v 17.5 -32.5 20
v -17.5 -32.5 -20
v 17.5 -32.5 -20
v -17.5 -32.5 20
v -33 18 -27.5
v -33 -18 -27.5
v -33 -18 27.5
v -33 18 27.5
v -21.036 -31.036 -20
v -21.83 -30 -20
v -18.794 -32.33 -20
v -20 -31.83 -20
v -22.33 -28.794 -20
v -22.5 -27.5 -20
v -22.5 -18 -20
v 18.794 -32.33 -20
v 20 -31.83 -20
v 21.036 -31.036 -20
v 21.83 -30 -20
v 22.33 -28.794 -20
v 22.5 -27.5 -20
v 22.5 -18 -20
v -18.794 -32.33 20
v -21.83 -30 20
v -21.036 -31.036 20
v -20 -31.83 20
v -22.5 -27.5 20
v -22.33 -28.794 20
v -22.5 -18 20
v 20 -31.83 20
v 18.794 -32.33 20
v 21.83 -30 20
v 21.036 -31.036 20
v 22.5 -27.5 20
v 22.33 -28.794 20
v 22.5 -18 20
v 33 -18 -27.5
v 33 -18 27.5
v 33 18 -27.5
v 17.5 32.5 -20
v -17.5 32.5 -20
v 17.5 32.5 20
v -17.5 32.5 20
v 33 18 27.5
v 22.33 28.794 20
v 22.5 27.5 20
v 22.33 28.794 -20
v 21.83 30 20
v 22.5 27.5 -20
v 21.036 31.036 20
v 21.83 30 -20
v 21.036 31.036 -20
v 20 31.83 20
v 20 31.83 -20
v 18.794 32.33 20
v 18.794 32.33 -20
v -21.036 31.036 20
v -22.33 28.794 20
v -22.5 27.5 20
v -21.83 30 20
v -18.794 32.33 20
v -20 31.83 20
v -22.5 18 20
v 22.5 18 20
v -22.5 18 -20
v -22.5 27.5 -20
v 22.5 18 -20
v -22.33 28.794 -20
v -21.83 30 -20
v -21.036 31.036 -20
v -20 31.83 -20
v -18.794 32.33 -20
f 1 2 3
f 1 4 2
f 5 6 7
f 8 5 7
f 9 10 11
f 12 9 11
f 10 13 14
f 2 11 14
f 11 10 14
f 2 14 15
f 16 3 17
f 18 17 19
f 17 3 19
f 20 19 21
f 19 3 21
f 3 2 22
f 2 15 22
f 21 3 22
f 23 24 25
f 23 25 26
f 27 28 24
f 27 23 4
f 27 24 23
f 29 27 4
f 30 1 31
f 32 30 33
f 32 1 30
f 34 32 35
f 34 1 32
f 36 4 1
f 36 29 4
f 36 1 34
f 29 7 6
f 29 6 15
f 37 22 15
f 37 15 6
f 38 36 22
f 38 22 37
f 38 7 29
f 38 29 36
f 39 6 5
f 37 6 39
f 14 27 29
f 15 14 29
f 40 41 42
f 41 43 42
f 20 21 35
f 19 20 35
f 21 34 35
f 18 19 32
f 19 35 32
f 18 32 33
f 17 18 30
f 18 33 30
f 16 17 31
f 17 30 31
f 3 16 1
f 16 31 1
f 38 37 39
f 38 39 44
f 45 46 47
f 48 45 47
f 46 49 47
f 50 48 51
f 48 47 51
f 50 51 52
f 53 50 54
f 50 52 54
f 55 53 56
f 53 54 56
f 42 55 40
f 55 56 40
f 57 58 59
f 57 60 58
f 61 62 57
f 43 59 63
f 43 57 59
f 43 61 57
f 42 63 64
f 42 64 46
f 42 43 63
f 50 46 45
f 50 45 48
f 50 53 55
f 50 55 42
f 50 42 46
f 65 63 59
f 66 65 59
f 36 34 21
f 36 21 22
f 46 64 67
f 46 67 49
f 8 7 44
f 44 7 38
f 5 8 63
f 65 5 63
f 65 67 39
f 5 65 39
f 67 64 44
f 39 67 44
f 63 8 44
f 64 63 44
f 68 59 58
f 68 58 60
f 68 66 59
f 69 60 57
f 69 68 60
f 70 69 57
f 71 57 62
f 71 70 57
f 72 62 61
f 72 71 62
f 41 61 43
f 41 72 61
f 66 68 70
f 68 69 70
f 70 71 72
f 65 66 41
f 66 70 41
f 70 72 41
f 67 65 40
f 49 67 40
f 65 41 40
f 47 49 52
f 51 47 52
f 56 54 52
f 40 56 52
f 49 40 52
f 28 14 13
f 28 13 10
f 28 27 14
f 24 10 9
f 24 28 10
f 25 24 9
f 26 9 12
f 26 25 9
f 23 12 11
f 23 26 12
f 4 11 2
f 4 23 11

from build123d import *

# Parameters (mm, degrees)
SKETCH001_W  = 45
SKETCH001_H  = 65
PAD001_DEPTH = 20
FILLET_R     = 5
SKETCH_W     = 66
SKETCH_H     = 55
PAD_DEPTH    = 18


with BuildPart() as coil:
    # Sketch001 → Pad001 (new body, symmetric)
    with BuildSketch(Plane.XY):
        Rectangle(SKETCH001_W, SKETCH001_H)
    extrude(amount=PAD001_DEPTH, both=True)

    # Fillet
    fillet_edges = [coil.edges().sort_by_distance(p)[0] for p in [
        (-22.5, -32.5, 0),
        (22.5, -32.5, 0),
        (22.5, 32.5, 0),
        (-22.5, 32.5, 0),
    ]]
    fillet(fillet_edges, radius=FILLET_R)


with BuildPart() as fusion_of_core_and_coil:
    # Sketch → Pad (new body, symmetric)
    with BuildSketch(Plane.XZ):
        Rectangle(SKETCH_W, SKETCH_H)
    extrude(amount=PAD_DEPTH, both=True)

    # Fusion: union Coil
    add(coil.part)


solid = fusion_of_core_and_coil.part
